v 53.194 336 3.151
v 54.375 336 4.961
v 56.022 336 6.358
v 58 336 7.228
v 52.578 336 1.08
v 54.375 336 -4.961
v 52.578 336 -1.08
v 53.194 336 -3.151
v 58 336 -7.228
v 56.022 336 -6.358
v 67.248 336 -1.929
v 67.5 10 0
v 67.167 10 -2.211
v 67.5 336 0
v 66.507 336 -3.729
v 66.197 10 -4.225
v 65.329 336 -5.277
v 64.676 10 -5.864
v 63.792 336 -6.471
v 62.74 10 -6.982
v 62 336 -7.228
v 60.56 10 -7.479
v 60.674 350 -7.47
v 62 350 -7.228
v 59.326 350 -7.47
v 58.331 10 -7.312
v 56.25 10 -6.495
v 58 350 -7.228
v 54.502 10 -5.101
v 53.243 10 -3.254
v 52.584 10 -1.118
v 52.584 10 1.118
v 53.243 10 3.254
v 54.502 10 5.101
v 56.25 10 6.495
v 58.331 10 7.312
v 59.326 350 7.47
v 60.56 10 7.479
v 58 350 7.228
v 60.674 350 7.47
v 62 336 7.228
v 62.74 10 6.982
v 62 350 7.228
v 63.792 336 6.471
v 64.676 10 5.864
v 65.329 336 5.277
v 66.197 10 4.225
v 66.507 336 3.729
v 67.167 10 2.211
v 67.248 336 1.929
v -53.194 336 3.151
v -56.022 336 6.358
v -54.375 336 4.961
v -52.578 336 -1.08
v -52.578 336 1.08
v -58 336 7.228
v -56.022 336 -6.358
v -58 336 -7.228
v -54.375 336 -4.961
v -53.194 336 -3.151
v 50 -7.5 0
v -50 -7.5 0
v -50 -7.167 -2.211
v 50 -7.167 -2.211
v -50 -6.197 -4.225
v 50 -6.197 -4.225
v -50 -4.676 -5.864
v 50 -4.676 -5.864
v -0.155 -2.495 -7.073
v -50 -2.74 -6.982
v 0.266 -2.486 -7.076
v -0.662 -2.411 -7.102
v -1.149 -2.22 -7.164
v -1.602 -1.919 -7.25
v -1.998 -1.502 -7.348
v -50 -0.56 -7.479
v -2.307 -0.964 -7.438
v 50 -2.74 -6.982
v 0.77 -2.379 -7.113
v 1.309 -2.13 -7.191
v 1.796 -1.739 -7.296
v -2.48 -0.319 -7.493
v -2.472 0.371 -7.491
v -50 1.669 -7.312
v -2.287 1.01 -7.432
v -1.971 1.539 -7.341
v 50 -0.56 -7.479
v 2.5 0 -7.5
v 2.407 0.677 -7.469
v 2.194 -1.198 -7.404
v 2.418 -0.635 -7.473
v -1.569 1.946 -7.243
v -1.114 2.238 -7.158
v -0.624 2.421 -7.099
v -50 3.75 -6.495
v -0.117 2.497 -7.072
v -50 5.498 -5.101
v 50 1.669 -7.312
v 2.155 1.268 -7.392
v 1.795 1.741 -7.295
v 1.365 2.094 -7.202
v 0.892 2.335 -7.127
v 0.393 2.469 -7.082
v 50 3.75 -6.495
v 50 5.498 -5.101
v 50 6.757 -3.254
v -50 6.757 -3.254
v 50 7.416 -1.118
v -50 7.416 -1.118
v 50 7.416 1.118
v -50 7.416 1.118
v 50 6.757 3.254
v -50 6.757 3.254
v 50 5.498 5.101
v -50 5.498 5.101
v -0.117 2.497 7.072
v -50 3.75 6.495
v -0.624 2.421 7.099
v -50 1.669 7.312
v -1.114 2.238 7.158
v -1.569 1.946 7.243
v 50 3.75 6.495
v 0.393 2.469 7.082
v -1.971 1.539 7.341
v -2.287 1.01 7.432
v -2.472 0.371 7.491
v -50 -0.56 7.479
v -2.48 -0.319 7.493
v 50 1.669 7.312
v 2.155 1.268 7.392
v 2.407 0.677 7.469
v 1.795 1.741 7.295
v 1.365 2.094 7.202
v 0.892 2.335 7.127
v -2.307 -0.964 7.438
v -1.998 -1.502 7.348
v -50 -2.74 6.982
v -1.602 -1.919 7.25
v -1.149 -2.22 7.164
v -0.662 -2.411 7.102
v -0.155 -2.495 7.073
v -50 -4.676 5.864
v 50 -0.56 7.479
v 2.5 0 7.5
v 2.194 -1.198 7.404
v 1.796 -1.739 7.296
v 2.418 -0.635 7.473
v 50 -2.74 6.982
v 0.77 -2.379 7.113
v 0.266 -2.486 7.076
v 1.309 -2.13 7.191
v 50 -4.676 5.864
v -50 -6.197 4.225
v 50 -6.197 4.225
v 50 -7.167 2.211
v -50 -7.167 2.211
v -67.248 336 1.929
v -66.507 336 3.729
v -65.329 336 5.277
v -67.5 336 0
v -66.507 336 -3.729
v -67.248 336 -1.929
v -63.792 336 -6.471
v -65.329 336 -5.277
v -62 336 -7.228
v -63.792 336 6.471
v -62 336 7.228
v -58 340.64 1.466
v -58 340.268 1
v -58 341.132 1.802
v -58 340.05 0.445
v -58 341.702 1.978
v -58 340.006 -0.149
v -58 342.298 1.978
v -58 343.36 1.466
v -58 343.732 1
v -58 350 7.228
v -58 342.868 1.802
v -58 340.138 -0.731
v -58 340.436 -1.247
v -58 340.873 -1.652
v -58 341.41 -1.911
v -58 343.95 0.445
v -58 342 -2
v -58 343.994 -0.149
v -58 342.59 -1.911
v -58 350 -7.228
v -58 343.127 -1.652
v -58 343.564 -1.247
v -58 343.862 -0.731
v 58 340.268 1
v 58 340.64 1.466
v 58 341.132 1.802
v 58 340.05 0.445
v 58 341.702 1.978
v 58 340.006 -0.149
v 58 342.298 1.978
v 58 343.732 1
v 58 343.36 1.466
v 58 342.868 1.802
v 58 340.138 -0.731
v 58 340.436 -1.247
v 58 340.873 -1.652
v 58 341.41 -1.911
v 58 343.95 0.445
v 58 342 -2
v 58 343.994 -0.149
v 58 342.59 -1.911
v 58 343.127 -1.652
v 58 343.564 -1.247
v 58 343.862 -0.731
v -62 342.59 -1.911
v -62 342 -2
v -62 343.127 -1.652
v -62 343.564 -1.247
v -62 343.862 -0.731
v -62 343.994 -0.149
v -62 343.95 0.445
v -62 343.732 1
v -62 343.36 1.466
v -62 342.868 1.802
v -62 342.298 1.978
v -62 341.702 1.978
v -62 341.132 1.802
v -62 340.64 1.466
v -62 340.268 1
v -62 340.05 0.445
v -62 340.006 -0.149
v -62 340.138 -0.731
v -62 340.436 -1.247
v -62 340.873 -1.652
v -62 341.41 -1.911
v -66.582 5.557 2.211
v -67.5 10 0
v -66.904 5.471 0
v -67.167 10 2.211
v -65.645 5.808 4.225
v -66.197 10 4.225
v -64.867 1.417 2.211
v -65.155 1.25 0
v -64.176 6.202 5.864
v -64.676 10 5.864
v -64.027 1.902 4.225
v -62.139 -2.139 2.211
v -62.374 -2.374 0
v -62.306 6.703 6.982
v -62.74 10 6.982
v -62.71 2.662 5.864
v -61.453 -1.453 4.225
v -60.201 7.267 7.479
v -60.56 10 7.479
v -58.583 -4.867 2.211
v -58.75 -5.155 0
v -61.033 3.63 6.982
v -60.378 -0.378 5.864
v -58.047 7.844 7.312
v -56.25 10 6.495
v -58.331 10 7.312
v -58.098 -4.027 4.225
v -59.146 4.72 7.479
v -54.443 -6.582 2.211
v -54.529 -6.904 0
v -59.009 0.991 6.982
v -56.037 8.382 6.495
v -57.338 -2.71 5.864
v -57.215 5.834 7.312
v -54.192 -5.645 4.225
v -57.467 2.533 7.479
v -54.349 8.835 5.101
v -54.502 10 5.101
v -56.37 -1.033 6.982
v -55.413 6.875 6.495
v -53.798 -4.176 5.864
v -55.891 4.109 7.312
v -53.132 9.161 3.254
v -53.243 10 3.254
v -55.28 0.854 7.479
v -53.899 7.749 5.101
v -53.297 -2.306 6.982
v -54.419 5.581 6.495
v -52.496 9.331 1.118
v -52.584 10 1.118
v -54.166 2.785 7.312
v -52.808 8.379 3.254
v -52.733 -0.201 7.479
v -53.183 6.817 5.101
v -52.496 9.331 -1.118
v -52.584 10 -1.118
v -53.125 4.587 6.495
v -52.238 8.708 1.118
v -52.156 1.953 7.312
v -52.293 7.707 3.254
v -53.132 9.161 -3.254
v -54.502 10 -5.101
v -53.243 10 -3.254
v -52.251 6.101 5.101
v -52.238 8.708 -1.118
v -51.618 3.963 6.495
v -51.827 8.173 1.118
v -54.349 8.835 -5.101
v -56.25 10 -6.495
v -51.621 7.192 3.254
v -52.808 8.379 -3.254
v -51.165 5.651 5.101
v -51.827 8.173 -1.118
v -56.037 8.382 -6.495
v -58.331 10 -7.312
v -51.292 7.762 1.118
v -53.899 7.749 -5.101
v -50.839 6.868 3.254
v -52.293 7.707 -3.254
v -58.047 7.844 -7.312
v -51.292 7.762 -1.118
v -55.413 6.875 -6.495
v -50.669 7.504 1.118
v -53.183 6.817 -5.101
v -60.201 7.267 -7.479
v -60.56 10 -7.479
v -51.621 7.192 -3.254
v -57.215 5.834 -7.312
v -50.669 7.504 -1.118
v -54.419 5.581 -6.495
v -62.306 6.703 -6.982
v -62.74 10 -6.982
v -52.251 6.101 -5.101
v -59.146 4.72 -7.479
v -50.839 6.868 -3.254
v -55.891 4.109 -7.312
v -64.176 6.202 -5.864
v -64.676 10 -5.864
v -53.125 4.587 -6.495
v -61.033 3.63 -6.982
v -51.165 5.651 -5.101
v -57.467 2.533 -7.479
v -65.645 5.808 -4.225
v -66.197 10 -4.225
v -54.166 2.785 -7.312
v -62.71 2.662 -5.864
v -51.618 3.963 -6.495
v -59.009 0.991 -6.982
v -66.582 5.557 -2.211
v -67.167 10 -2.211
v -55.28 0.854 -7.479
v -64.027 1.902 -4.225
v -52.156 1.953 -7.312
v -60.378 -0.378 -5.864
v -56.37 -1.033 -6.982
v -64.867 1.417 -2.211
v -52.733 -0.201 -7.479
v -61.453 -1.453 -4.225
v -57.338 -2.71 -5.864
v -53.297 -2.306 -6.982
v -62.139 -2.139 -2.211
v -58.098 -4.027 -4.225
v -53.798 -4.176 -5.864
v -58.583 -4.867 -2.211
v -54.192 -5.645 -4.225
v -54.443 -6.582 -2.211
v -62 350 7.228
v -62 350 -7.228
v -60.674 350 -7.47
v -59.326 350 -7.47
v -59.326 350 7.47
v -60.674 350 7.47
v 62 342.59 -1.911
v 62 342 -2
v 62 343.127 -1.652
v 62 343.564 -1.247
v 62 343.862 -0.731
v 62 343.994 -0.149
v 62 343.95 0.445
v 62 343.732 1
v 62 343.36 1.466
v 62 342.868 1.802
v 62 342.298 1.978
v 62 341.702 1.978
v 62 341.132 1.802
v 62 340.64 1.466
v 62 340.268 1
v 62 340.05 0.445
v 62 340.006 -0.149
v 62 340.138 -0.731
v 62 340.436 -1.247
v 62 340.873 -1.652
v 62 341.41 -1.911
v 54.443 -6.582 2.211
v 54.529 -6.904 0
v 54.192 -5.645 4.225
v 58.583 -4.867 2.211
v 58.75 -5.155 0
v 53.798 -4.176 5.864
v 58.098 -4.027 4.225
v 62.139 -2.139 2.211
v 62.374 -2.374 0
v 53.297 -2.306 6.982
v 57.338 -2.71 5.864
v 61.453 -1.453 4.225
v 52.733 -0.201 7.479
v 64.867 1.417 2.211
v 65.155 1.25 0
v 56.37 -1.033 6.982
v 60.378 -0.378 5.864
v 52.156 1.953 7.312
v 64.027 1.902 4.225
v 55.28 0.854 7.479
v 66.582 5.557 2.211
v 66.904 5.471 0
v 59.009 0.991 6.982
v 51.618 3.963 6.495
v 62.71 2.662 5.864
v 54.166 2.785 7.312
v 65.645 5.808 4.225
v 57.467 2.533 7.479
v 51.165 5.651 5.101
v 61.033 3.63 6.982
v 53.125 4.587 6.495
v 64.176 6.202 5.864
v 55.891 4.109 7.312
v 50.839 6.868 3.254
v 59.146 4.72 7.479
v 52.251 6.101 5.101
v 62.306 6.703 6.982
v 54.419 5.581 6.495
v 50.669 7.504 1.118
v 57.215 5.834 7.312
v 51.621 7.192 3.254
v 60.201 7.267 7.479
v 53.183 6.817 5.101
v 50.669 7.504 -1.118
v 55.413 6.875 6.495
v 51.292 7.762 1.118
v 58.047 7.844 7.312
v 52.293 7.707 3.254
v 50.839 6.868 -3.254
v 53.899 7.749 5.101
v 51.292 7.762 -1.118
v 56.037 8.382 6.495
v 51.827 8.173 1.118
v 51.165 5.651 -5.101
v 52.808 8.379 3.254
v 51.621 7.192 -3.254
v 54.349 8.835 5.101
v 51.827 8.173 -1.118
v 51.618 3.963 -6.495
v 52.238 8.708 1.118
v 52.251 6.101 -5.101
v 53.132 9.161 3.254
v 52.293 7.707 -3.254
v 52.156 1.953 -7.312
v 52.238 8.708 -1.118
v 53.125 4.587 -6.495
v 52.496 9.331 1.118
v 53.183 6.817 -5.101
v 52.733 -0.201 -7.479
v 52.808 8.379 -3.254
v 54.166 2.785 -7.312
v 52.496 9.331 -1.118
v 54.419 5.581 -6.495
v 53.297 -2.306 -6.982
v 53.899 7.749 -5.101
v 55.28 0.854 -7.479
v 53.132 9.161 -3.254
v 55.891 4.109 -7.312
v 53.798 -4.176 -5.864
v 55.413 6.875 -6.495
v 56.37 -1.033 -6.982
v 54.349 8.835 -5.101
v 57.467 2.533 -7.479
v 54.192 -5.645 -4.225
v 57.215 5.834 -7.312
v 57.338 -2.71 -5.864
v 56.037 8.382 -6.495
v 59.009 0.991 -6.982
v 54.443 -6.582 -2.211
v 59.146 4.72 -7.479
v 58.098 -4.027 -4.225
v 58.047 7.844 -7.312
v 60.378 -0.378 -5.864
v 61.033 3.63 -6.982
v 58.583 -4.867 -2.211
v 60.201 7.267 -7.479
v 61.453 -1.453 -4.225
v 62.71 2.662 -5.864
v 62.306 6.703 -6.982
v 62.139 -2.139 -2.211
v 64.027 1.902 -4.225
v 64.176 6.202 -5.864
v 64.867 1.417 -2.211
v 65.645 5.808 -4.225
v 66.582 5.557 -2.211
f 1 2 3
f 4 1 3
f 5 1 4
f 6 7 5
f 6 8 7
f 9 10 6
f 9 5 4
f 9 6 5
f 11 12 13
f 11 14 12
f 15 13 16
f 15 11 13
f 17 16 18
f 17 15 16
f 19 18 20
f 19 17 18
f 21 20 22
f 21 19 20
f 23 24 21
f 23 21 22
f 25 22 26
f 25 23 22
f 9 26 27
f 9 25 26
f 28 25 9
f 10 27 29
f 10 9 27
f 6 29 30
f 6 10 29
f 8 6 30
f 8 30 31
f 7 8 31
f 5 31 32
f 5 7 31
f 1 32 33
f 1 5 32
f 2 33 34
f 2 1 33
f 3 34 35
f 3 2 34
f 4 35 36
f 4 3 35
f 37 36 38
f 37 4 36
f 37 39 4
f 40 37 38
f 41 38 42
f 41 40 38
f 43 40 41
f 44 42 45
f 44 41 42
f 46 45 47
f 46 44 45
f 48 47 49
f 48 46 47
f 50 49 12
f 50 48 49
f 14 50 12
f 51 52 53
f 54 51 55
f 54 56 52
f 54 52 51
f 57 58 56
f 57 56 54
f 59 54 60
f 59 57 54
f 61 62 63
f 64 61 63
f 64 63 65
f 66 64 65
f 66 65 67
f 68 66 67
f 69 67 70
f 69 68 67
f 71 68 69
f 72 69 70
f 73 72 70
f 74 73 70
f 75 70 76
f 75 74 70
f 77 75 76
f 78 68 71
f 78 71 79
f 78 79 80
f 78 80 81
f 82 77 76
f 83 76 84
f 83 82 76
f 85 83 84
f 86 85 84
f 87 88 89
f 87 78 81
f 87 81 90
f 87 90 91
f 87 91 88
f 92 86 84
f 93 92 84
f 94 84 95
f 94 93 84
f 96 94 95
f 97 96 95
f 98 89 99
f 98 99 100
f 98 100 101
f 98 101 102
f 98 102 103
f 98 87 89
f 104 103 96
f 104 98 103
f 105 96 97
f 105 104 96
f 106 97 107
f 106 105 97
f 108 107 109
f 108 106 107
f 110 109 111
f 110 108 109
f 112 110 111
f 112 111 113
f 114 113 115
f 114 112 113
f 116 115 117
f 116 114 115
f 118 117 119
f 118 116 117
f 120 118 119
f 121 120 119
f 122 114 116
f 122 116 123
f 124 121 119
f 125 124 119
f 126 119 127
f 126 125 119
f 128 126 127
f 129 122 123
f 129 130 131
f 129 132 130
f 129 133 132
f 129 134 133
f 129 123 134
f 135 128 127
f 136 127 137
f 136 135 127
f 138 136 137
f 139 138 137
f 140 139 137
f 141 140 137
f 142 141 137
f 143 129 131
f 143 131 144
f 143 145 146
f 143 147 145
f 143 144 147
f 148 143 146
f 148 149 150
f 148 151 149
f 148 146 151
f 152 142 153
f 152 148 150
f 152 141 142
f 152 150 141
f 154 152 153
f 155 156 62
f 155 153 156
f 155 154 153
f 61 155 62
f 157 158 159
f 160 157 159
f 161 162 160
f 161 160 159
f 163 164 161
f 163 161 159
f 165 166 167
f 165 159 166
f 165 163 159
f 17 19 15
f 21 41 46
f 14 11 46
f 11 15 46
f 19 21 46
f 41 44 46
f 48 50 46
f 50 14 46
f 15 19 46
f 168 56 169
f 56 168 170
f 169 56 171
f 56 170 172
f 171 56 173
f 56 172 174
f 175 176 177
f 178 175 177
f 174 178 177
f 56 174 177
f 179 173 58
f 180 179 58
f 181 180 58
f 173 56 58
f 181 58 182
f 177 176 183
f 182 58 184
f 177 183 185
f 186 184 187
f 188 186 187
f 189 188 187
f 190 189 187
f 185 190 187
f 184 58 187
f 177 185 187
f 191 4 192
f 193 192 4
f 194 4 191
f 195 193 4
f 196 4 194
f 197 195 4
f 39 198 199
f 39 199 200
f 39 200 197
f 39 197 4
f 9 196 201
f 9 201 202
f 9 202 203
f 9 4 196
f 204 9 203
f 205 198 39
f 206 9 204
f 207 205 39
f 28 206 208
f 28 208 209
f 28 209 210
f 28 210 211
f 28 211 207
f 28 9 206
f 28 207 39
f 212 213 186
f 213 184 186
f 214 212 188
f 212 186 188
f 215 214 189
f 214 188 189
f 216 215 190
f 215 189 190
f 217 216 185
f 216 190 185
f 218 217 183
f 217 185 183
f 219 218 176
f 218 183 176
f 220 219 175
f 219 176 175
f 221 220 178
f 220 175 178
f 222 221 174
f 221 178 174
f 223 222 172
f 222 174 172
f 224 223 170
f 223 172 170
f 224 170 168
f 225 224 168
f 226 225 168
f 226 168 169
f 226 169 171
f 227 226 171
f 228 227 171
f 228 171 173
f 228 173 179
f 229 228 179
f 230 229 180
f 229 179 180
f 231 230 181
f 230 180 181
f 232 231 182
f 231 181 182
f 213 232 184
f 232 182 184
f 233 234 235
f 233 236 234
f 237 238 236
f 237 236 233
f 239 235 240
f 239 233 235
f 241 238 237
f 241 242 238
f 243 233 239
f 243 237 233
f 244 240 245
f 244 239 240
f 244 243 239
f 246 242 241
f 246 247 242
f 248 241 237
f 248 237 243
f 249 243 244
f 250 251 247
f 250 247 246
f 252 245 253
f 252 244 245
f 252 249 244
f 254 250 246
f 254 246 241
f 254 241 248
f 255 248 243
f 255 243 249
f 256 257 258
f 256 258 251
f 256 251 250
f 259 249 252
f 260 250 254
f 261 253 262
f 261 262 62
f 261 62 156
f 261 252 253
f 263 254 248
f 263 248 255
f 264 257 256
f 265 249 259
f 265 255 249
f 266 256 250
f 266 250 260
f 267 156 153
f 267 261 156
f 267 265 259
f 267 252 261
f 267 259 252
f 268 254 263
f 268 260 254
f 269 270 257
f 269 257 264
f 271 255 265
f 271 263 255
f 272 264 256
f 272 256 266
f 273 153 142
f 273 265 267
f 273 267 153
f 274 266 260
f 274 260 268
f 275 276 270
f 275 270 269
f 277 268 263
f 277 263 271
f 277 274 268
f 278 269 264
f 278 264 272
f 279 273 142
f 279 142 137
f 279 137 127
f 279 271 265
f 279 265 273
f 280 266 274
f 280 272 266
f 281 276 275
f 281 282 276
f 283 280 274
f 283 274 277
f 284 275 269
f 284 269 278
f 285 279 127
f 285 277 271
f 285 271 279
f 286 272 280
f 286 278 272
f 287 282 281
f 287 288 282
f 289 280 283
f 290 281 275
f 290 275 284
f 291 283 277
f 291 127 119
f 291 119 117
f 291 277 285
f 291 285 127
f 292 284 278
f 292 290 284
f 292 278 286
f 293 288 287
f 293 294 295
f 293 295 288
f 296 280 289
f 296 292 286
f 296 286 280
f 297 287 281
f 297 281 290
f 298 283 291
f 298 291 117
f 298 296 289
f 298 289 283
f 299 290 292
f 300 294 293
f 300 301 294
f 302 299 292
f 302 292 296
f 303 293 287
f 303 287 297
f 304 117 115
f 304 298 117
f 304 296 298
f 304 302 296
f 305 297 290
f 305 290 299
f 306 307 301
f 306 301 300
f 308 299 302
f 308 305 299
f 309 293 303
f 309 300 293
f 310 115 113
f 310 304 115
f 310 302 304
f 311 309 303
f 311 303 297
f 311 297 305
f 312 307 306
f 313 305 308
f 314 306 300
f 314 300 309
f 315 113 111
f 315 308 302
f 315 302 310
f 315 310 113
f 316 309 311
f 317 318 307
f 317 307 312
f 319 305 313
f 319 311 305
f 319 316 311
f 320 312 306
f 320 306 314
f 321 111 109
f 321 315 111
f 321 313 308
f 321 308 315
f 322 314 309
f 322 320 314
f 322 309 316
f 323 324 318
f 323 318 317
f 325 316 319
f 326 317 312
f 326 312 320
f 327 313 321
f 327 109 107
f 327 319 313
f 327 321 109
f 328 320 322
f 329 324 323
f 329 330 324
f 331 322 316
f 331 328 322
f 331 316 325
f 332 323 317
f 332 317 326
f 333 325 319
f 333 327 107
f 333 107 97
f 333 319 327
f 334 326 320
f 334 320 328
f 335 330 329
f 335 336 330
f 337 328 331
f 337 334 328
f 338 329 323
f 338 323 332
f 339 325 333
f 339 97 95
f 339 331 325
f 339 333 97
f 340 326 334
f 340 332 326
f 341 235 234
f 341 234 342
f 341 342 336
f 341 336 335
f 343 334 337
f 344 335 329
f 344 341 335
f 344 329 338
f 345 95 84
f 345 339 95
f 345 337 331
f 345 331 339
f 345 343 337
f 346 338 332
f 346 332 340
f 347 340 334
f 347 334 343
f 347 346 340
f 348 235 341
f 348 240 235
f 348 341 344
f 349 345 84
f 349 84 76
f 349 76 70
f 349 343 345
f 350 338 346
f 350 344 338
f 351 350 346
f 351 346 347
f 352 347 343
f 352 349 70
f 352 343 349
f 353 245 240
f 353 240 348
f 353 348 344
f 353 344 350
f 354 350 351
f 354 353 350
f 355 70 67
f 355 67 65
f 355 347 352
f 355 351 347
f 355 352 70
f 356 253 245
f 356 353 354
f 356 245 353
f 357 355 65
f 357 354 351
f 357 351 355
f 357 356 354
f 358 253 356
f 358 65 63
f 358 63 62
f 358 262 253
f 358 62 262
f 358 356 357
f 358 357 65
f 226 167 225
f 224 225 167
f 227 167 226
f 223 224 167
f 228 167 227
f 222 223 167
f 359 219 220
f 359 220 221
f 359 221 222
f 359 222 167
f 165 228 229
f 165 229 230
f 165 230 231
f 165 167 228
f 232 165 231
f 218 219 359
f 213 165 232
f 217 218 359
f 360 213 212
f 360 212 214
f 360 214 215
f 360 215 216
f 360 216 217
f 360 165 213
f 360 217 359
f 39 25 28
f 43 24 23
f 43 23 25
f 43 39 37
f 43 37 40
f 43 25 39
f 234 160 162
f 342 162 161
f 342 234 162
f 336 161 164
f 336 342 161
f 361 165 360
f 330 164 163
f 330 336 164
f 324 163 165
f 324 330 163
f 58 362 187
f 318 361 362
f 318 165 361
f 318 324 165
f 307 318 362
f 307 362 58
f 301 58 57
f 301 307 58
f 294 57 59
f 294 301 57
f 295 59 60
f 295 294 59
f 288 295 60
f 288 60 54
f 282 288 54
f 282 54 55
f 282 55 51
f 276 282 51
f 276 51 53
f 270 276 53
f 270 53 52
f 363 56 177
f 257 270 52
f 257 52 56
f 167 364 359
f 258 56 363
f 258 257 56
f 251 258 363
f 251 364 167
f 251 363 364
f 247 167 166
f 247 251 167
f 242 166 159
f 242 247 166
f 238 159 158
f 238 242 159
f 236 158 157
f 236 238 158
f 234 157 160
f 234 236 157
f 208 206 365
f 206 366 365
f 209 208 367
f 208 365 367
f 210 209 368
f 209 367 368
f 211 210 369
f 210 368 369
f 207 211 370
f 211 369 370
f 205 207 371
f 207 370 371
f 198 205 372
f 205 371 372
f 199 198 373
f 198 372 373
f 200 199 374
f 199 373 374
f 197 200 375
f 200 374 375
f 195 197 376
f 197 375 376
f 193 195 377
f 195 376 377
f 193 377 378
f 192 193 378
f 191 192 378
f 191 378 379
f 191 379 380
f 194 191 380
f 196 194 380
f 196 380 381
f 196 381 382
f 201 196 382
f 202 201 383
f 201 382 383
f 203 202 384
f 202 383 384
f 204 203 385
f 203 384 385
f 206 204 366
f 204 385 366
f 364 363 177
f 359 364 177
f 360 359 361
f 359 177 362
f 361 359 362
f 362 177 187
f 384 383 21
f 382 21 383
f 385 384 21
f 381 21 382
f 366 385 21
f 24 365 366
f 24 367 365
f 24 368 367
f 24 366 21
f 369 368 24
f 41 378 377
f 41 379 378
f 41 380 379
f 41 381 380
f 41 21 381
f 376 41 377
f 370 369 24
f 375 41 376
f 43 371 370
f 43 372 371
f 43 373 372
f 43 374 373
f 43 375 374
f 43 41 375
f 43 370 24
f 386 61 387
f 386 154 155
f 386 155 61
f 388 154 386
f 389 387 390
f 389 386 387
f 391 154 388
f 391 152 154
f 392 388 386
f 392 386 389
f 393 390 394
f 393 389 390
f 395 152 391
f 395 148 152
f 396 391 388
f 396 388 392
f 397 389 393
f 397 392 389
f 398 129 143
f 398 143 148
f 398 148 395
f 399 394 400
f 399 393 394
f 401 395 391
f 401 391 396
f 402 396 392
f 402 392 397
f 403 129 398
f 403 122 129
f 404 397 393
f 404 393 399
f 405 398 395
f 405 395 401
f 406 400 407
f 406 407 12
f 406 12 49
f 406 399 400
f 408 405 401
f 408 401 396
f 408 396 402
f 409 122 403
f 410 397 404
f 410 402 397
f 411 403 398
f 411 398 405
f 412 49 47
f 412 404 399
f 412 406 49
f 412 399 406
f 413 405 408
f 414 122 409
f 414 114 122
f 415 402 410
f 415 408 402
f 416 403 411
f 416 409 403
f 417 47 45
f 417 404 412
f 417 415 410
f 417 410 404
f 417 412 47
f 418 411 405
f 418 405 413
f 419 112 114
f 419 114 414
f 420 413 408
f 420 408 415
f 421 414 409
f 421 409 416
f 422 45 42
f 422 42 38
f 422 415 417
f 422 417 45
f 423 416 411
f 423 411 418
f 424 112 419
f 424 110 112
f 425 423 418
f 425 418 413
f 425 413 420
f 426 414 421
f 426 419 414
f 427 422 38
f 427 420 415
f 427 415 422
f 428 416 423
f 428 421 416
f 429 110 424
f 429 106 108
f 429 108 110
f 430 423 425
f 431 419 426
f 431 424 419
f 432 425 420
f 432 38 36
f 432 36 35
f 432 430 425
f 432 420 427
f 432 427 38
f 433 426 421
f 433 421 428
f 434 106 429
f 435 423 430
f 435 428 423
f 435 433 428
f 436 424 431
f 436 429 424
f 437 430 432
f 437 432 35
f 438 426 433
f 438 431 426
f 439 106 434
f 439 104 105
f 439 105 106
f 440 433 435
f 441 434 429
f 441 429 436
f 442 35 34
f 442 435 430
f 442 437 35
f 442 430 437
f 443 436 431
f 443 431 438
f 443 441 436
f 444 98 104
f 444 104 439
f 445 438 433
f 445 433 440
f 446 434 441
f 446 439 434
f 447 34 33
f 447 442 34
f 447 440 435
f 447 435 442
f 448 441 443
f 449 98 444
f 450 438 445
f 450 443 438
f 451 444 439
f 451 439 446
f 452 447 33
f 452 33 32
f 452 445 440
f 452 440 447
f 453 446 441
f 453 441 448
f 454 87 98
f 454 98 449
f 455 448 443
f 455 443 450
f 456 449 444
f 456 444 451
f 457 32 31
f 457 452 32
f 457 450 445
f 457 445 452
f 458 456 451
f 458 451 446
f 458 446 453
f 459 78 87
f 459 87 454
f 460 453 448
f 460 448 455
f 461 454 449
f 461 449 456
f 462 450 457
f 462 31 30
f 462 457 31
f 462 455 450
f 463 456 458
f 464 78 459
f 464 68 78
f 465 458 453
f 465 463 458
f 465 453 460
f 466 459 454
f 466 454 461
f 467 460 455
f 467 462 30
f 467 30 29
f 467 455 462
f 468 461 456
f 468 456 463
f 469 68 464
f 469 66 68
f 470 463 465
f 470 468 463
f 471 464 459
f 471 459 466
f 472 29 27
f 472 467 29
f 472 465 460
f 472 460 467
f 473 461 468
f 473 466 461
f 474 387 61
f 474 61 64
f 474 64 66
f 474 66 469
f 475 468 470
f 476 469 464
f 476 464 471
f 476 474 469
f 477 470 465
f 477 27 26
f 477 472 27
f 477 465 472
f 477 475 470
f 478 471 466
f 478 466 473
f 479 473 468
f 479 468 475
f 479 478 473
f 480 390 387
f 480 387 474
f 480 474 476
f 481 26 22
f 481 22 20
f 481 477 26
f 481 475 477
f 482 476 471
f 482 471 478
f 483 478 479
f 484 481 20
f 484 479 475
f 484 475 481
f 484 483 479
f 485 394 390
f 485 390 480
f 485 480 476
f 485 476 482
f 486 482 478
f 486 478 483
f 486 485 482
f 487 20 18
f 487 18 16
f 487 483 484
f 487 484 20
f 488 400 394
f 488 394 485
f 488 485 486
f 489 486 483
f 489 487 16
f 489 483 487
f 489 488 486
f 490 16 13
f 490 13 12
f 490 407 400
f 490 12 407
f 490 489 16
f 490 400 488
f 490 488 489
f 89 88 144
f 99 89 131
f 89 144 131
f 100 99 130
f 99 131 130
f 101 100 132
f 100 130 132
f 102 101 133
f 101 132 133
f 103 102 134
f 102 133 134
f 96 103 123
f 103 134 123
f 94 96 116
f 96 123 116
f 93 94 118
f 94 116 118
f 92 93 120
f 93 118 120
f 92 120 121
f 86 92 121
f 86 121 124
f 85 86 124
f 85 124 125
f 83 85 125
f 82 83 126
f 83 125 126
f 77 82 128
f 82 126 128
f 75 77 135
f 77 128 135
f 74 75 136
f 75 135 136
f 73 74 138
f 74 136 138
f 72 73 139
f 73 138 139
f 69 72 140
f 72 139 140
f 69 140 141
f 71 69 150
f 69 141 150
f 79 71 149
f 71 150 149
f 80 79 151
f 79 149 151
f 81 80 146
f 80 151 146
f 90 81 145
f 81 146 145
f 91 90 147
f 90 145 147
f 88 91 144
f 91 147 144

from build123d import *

# Parameters (mm, degrees)
SWEEP2_PROFILE_R   = 7.5
SKETCH41_W         = 5.5
SKETCH41_H         = 14
CUT_EXTRUDE1_DEPTH = 7.5
SKETCH40_R         = 2
CUT_EXTRUDE2_DEPTH = 65
SKETCH42_R         = 2.5
CUT_EXTRUDE3_DEPTH = 10


with BuildPart() as part:
    # Sweep2: sweep along a path in Sketch1
    with BuildLine(Plane.XY) as sweep2_path:
        Line((-60, 350), (-60, 10))
        ThreePointArc((-60, 10), (-57.071067812, 2.928932188), (-50, 0))
        Line((-50, 0), (50, 0))
        ThreePointArc((50, 0), (57.071067812, 2.928932188), (60, 10))
        Line((60, 10), (60, 350))
    # Sweep2 profile (on start of the path) → Sweep2 (sweep)
    with BuildSketch(Plane(origin=(-60, 350, 0), x_dir=(-1, 0, 0), z_dir=(0, -1, 0))):
        Circle(SWEEP2_PROFILE_R)
    sweep(path=sweep2_path.line)

    # Sketch41 → Cut-Extrude1 (cut, symmetric)
    with BuildSketch(Plane.XY):
        with Locations((-64.75, 343)):
            Rectangle(SKETCH41_W, SKETCH41_H)
        with Locations((-55.25, 343)):
            Rectangle(SKETCH41_W, SKETCH41_H)
        with Locations((55.25, 343)):
            Rectangle(SKETCH41_W, SKETCH41_H)
        with Locations((64.75, 343)):
            Rectangle(SKETCH41_W, SKETCH41_H)
    extrude(amount=CUT_EXTRUDE1_DEPTH, both=True, mode=Mode.SUBTRACT)

    # Sketch40 → Cut-Extrude2 (cut, symmetric)
    with BuildSketch(Plane(origin=(0, 0, 0), x_dir=(0, 0, -1), z_dir=(1, 0, 0))):
        with Locations((0, 342)):
            Circle(SKETCH40_R)
    extrude(amount=CUT_EXTRUDE2_DEPTH, both=True, mode=Mode.SUBTRACT)

    # Sketch42 → Cut-Extrude3 (cut, symmetric)
    with BuildSketch(Plane.XY):
        Circle(SKETCH42_R)
    extrude(amount=CUT_EXTRUDE3_DEPTH, both=True, mode=Mode.SUBTRACT)


solid = part.part
